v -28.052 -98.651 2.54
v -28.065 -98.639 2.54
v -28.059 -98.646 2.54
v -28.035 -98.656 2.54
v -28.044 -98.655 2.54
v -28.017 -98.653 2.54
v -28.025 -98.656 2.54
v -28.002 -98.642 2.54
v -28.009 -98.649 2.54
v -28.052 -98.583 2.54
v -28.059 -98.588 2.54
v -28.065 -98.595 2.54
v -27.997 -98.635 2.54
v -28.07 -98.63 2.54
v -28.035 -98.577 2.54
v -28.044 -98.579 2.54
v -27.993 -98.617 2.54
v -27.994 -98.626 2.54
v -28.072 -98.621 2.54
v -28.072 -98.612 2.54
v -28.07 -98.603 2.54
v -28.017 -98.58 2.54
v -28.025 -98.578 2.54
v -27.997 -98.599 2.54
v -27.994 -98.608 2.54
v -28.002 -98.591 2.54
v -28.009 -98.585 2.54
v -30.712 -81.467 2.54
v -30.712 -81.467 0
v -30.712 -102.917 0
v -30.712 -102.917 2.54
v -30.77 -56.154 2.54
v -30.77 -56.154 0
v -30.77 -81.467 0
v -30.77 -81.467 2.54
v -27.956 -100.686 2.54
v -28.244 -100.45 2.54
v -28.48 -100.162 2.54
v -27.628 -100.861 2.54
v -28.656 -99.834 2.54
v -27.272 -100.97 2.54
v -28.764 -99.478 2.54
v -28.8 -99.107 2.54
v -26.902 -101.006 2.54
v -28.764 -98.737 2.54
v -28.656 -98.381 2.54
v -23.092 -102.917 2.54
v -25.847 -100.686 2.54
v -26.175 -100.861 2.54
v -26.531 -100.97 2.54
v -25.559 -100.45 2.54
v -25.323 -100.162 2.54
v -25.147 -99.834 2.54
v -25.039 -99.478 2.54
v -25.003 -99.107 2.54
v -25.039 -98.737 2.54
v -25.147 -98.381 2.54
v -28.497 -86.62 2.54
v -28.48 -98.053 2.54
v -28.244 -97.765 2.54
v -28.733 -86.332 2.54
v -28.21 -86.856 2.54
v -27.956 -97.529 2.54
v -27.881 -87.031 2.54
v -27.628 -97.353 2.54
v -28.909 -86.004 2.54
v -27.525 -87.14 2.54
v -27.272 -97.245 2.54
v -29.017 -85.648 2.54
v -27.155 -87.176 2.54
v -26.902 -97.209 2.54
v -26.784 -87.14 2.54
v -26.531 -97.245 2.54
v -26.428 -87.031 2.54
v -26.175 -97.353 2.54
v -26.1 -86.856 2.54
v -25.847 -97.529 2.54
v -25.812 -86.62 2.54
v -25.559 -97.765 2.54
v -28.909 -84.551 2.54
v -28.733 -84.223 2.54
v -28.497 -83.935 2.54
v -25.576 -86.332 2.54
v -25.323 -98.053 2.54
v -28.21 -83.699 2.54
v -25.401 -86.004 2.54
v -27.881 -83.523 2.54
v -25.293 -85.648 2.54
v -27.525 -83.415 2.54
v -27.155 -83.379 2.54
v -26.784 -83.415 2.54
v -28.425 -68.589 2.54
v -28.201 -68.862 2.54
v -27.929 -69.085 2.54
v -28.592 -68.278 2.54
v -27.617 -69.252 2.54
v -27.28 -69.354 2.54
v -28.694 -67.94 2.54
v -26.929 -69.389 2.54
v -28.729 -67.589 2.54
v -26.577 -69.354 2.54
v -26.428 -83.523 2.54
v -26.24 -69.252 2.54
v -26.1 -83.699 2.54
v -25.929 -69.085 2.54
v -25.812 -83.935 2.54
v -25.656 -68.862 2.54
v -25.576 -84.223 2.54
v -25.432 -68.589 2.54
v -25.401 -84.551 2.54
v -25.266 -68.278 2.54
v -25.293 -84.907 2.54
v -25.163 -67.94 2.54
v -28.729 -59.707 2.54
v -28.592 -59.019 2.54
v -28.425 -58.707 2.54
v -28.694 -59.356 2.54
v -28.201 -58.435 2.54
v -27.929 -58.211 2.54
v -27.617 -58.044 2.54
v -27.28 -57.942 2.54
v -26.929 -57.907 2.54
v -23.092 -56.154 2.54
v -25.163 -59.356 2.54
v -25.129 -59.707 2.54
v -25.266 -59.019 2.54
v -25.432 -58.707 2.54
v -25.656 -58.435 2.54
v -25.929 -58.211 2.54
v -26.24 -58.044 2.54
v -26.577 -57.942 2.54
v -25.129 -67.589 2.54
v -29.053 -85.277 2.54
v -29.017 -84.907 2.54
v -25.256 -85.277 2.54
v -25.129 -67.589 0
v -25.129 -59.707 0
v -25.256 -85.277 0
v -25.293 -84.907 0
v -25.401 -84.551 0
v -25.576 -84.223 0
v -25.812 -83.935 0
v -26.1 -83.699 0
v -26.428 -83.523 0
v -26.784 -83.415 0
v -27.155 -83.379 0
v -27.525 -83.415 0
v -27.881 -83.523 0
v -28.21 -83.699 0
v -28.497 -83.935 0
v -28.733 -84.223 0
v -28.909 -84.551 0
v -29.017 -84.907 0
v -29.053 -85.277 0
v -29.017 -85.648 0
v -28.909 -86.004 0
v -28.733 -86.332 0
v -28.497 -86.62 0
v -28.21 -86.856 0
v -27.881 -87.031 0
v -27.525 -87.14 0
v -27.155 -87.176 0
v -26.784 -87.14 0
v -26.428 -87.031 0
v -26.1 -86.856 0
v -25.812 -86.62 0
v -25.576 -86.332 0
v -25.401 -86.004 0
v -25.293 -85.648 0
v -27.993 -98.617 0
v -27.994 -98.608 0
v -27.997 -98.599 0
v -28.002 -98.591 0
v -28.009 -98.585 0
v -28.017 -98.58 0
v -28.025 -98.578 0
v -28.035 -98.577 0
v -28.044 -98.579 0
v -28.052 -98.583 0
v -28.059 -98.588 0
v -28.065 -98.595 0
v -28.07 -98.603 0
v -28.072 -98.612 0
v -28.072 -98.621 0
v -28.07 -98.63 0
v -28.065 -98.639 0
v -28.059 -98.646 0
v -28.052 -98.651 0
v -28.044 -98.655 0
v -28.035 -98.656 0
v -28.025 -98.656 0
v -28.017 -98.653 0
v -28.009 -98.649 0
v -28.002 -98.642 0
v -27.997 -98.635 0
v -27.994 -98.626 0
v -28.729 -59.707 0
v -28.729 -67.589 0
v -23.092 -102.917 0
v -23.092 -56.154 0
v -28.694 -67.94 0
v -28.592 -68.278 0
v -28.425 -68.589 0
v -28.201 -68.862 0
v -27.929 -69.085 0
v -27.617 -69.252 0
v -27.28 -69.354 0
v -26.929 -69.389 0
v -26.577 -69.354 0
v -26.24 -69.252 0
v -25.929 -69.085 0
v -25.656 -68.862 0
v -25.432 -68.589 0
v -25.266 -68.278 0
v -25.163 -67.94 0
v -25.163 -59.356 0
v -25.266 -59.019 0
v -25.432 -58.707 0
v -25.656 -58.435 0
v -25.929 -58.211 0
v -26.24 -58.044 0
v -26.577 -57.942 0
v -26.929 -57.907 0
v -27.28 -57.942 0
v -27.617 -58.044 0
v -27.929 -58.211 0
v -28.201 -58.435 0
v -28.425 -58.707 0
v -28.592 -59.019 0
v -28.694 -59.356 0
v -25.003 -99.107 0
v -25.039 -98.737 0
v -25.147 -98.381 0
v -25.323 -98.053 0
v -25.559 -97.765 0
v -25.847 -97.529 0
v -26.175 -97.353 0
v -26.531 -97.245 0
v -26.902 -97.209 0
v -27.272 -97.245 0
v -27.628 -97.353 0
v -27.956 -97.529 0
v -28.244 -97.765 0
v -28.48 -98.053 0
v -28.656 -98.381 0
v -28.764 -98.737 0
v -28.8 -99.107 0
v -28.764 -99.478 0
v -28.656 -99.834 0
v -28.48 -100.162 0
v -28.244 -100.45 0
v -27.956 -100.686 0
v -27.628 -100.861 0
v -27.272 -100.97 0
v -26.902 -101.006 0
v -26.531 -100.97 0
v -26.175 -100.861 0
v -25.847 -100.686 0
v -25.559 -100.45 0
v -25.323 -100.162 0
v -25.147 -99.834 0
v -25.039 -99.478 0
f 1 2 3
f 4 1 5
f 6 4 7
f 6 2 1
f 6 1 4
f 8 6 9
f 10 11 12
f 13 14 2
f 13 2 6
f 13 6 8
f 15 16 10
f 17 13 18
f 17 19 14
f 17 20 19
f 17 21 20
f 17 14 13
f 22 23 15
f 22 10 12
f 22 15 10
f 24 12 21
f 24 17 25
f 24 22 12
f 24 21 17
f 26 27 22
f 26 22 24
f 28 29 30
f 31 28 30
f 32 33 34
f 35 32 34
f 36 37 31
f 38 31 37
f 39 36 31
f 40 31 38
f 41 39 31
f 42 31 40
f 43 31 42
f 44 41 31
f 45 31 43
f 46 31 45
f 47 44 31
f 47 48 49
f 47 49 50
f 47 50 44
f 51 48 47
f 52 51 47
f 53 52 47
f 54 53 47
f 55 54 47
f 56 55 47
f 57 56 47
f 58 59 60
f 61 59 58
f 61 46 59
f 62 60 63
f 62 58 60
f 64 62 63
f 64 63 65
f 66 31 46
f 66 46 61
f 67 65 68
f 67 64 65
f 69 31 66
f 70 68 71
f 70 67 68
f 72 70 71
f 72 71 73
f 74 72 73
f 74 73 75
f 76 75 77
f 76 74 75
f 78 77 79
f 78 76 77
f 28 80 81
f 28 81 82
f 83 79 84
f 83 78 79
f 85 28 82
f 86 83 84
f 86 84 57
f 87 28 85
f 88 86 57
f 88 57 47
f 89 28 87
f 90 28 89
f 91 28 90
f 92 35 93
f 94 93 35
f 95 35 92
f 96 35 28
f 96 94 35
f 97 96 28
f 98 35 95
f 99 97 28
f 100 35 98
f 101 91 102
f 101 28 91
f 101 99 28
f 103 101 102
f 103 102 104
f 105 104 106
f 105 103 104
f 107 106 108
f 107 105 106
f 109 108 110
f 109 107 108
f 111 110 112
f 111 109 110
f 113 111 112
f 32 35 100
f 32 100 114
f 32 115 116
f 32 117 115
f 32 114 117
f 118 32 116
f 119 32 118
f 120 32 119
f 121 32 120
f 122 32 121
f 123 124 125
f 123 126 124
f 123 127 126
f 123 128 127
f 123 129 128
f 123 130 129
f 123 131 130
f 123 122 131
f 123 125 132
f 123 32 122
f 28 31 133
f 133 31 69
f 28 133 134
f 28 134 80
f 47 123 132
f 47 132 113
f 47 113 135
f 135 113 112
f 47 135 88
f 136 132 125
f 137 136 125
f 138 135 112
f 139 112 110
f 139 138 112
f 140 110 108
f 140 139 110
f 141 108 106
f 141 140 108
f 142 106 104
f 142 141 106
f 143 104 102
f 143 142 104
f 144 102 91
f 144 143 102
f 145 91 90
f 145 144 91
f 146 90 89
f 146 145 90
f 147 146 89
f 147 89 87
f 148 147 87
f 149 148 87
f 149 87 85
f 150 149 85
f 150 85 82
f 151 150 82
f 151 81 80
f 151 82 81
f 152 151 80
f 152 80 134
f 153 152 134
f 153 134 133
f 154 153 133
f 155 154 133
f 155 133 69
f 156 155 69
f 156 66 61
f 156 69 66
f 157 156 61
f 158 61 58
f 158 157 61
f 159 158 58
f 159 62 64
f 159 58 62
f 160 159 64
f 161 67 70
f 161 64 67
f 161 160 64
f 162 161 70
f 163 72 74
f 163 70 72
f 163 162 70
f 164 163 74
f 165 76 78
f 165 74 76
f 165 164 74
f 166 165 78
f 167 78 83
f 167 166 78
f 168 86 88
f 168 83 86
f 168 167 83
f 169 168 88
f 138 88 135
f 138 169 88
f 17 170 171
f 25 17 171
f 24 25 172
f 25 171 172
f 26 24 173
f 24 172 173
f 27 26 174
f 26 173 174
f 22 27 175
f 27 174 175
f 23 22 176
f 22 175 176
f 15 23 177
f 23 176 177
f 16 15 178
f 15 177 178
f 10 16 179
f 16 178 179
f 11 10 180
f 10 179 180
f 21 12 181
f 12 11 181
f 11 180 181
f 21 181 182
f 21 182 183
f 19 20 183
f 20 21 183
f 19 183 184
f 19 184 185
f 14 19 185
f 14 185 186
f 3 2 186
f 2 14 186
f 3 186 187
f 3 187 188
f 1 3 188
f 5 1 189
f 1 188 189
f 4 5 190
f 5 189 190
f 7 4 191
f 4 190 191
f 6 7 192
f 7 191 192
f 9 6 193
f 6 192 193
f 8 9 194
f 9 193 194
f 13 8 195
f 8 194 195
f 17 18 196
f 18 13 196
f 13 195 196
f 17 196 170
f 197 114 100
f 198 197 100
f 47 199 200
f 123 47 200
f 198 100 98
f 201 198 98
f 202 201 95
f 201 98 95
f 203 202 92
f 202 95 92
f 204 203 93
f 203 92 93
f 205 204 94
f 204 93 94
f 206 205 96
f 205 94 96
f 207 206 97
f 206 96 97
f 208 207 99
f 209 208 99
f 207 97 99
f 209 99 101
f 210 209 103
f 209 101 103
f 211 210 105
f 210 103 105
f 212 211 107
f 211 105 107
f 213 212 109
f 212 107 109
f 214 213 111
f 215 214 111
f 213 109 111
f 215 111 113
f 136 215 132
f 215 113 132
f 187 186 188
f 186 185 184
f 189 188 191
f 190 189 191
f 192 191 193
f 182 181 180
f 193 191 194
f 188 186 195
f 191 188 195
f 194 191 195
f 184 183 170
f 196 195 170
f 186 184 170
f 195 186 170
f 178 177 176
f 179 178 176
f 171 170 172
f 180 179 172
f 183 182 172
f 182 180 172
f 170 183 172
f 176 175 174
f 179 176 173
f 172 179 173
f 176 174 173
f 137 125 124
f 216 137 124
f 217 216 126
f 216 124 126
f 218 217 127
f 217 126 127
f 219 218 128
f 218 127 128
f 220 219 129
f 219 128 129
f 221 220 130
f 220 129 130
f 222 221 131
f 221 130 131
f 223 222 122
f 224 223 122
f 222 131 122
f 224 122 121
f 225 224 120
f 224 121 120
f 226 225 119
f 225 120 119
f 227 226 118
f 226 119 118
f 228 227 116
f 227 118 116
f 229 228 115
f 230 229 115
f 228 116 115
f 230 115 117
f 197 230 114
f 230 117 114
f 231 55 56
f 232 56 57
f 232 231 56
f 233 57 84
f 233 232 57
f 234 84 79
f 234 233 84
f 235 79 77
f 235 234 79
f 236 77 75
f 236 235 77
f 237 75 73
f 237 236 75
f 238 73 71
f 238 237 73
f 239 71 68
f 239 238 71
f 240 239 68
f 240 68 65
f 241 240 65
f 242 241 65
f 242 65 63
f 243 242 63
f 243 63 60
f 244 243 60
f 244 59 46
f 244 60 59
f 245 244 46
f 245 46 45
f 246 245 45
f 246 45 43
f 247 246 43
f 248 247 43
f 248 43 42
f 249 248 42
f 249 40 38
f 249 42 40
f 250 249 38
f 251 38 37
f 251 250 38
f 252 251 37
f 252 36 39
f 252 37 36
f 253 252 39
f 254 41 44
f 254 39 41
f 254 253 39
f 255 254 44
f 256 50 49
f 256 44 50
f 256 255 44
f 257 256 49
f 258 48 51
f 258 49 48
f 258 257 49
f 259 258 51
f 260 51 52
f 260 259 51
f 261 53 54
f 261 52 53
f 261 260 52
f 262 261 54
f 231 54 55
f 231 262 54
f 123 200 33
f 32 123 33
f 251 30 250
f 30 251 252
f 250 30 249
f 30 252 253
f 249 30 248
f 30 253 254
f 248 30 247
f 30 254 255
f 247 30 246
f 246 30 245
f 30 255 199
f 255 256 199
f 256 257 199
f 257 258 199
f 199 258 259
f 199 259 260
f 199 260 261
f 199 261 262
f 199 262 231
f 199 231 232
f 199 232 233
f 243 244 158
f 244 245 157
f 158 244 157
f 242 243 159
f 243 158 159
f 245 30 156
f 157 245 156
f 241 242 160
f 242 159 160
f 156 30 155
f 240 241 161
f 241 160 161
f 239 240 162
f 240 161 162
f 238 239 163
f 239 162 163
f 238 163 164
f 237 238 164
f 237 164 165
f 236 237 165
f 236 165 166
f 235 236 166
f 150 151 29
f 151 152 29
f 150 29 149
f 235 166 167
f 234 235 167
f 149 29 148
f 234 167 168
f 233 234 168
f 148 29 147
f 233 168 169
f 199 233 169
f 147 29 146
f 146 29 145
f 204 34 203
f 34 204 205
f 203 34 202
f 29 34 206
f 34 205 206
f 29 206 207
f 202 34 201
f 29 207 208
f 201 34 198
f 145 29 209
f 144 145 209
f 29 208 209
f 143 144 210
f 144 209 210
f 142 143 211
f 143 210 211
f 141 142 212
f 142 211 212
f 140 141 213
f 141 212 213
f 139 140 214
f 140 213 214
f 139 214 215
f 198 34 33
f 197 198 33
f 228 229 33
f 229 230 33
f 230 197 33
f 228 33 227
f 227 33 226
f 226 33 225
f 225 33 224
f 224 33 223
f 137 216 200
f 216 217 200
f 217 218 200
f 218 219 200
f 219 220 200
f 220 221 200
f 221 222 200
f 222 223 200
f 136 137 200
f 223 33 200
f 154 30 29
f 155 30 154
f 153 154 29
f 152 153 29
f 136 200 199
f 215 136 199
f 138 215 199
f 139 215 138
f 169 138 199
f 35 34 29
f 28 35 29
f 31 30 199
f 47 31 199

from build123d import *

# Parameters (mm, degrees)
BOSS_EXTRUDE1_DEPTH = 2.54
SKETCH2_R           = 1.89865
SKETCH2_R_2         = 2.356522007
SKETCH2_R_3         = 0.039656004
CUT_EXTRUDE1_DEPTH  = 4.572
CUT_EXTRUDE2_DEPTH  = 2.54


with BuildPart() as part:
    # Sketch3 → Boss-Extrude1 (new body)
    with BuildSketch(Plane.XY):
        Polygon((-30.711579586, -81.467357182), (-30.711579586, -102.917357182), (-23.091579586, -102.917357182), (-23.091579586, -56.153840626), (-30.770178896, -56.153840626), (-30.770178896, -81.467357182), align=None)
    extrude(amount=BOSS_EXTRUDE1_DEPTH)

    # Sketch2 → Cut-Extrude1 (cut)
    with BuildSketch(Plane.XY):
        with Locations((-27.154806567, -85.277357182)):
            Circle(SKETCH2_R)
        Circle(SKETCH2_R_2)
        with Locations((-26.901579586, -99.107357182)):
            Circle(SKETCH2_R)
        with Locations((-28.03226704, -98.616862848)):
            Circle(SKETCH2_R_3, mode=Mode.SUBTRACT)
    extrude(amount=CUT_EXTRUDE1_DEPTH, mode=Mode.SUBTRACT)

    # Sketch4 → Cut-Extrude2 (cut)
    with BuildSketch(Plane.XY.offset(2.54)):
        with BuildLine():
            Line((-28.728652743, -59.707357268), (-28.728652743, -67.588775762))
            ThreePointArc((-28.728652743, -67.588775762), (-26.928652787, -69.388775718), (-25.128652831, -67.588775762))
            Line((-25.128652831, -67.588775762), (-25.128652831, -59.707357268))
            ThreePointArc((-25.128652831, -59.707357268), (-26.928652787, -57.907357312), (-28.728652743, -59.707357268))
        make_face()
    extrude(amount=-CUT_EXTRUDE2_DEPTH, mode=Mode.SUBTRACT)


solid = part.part
